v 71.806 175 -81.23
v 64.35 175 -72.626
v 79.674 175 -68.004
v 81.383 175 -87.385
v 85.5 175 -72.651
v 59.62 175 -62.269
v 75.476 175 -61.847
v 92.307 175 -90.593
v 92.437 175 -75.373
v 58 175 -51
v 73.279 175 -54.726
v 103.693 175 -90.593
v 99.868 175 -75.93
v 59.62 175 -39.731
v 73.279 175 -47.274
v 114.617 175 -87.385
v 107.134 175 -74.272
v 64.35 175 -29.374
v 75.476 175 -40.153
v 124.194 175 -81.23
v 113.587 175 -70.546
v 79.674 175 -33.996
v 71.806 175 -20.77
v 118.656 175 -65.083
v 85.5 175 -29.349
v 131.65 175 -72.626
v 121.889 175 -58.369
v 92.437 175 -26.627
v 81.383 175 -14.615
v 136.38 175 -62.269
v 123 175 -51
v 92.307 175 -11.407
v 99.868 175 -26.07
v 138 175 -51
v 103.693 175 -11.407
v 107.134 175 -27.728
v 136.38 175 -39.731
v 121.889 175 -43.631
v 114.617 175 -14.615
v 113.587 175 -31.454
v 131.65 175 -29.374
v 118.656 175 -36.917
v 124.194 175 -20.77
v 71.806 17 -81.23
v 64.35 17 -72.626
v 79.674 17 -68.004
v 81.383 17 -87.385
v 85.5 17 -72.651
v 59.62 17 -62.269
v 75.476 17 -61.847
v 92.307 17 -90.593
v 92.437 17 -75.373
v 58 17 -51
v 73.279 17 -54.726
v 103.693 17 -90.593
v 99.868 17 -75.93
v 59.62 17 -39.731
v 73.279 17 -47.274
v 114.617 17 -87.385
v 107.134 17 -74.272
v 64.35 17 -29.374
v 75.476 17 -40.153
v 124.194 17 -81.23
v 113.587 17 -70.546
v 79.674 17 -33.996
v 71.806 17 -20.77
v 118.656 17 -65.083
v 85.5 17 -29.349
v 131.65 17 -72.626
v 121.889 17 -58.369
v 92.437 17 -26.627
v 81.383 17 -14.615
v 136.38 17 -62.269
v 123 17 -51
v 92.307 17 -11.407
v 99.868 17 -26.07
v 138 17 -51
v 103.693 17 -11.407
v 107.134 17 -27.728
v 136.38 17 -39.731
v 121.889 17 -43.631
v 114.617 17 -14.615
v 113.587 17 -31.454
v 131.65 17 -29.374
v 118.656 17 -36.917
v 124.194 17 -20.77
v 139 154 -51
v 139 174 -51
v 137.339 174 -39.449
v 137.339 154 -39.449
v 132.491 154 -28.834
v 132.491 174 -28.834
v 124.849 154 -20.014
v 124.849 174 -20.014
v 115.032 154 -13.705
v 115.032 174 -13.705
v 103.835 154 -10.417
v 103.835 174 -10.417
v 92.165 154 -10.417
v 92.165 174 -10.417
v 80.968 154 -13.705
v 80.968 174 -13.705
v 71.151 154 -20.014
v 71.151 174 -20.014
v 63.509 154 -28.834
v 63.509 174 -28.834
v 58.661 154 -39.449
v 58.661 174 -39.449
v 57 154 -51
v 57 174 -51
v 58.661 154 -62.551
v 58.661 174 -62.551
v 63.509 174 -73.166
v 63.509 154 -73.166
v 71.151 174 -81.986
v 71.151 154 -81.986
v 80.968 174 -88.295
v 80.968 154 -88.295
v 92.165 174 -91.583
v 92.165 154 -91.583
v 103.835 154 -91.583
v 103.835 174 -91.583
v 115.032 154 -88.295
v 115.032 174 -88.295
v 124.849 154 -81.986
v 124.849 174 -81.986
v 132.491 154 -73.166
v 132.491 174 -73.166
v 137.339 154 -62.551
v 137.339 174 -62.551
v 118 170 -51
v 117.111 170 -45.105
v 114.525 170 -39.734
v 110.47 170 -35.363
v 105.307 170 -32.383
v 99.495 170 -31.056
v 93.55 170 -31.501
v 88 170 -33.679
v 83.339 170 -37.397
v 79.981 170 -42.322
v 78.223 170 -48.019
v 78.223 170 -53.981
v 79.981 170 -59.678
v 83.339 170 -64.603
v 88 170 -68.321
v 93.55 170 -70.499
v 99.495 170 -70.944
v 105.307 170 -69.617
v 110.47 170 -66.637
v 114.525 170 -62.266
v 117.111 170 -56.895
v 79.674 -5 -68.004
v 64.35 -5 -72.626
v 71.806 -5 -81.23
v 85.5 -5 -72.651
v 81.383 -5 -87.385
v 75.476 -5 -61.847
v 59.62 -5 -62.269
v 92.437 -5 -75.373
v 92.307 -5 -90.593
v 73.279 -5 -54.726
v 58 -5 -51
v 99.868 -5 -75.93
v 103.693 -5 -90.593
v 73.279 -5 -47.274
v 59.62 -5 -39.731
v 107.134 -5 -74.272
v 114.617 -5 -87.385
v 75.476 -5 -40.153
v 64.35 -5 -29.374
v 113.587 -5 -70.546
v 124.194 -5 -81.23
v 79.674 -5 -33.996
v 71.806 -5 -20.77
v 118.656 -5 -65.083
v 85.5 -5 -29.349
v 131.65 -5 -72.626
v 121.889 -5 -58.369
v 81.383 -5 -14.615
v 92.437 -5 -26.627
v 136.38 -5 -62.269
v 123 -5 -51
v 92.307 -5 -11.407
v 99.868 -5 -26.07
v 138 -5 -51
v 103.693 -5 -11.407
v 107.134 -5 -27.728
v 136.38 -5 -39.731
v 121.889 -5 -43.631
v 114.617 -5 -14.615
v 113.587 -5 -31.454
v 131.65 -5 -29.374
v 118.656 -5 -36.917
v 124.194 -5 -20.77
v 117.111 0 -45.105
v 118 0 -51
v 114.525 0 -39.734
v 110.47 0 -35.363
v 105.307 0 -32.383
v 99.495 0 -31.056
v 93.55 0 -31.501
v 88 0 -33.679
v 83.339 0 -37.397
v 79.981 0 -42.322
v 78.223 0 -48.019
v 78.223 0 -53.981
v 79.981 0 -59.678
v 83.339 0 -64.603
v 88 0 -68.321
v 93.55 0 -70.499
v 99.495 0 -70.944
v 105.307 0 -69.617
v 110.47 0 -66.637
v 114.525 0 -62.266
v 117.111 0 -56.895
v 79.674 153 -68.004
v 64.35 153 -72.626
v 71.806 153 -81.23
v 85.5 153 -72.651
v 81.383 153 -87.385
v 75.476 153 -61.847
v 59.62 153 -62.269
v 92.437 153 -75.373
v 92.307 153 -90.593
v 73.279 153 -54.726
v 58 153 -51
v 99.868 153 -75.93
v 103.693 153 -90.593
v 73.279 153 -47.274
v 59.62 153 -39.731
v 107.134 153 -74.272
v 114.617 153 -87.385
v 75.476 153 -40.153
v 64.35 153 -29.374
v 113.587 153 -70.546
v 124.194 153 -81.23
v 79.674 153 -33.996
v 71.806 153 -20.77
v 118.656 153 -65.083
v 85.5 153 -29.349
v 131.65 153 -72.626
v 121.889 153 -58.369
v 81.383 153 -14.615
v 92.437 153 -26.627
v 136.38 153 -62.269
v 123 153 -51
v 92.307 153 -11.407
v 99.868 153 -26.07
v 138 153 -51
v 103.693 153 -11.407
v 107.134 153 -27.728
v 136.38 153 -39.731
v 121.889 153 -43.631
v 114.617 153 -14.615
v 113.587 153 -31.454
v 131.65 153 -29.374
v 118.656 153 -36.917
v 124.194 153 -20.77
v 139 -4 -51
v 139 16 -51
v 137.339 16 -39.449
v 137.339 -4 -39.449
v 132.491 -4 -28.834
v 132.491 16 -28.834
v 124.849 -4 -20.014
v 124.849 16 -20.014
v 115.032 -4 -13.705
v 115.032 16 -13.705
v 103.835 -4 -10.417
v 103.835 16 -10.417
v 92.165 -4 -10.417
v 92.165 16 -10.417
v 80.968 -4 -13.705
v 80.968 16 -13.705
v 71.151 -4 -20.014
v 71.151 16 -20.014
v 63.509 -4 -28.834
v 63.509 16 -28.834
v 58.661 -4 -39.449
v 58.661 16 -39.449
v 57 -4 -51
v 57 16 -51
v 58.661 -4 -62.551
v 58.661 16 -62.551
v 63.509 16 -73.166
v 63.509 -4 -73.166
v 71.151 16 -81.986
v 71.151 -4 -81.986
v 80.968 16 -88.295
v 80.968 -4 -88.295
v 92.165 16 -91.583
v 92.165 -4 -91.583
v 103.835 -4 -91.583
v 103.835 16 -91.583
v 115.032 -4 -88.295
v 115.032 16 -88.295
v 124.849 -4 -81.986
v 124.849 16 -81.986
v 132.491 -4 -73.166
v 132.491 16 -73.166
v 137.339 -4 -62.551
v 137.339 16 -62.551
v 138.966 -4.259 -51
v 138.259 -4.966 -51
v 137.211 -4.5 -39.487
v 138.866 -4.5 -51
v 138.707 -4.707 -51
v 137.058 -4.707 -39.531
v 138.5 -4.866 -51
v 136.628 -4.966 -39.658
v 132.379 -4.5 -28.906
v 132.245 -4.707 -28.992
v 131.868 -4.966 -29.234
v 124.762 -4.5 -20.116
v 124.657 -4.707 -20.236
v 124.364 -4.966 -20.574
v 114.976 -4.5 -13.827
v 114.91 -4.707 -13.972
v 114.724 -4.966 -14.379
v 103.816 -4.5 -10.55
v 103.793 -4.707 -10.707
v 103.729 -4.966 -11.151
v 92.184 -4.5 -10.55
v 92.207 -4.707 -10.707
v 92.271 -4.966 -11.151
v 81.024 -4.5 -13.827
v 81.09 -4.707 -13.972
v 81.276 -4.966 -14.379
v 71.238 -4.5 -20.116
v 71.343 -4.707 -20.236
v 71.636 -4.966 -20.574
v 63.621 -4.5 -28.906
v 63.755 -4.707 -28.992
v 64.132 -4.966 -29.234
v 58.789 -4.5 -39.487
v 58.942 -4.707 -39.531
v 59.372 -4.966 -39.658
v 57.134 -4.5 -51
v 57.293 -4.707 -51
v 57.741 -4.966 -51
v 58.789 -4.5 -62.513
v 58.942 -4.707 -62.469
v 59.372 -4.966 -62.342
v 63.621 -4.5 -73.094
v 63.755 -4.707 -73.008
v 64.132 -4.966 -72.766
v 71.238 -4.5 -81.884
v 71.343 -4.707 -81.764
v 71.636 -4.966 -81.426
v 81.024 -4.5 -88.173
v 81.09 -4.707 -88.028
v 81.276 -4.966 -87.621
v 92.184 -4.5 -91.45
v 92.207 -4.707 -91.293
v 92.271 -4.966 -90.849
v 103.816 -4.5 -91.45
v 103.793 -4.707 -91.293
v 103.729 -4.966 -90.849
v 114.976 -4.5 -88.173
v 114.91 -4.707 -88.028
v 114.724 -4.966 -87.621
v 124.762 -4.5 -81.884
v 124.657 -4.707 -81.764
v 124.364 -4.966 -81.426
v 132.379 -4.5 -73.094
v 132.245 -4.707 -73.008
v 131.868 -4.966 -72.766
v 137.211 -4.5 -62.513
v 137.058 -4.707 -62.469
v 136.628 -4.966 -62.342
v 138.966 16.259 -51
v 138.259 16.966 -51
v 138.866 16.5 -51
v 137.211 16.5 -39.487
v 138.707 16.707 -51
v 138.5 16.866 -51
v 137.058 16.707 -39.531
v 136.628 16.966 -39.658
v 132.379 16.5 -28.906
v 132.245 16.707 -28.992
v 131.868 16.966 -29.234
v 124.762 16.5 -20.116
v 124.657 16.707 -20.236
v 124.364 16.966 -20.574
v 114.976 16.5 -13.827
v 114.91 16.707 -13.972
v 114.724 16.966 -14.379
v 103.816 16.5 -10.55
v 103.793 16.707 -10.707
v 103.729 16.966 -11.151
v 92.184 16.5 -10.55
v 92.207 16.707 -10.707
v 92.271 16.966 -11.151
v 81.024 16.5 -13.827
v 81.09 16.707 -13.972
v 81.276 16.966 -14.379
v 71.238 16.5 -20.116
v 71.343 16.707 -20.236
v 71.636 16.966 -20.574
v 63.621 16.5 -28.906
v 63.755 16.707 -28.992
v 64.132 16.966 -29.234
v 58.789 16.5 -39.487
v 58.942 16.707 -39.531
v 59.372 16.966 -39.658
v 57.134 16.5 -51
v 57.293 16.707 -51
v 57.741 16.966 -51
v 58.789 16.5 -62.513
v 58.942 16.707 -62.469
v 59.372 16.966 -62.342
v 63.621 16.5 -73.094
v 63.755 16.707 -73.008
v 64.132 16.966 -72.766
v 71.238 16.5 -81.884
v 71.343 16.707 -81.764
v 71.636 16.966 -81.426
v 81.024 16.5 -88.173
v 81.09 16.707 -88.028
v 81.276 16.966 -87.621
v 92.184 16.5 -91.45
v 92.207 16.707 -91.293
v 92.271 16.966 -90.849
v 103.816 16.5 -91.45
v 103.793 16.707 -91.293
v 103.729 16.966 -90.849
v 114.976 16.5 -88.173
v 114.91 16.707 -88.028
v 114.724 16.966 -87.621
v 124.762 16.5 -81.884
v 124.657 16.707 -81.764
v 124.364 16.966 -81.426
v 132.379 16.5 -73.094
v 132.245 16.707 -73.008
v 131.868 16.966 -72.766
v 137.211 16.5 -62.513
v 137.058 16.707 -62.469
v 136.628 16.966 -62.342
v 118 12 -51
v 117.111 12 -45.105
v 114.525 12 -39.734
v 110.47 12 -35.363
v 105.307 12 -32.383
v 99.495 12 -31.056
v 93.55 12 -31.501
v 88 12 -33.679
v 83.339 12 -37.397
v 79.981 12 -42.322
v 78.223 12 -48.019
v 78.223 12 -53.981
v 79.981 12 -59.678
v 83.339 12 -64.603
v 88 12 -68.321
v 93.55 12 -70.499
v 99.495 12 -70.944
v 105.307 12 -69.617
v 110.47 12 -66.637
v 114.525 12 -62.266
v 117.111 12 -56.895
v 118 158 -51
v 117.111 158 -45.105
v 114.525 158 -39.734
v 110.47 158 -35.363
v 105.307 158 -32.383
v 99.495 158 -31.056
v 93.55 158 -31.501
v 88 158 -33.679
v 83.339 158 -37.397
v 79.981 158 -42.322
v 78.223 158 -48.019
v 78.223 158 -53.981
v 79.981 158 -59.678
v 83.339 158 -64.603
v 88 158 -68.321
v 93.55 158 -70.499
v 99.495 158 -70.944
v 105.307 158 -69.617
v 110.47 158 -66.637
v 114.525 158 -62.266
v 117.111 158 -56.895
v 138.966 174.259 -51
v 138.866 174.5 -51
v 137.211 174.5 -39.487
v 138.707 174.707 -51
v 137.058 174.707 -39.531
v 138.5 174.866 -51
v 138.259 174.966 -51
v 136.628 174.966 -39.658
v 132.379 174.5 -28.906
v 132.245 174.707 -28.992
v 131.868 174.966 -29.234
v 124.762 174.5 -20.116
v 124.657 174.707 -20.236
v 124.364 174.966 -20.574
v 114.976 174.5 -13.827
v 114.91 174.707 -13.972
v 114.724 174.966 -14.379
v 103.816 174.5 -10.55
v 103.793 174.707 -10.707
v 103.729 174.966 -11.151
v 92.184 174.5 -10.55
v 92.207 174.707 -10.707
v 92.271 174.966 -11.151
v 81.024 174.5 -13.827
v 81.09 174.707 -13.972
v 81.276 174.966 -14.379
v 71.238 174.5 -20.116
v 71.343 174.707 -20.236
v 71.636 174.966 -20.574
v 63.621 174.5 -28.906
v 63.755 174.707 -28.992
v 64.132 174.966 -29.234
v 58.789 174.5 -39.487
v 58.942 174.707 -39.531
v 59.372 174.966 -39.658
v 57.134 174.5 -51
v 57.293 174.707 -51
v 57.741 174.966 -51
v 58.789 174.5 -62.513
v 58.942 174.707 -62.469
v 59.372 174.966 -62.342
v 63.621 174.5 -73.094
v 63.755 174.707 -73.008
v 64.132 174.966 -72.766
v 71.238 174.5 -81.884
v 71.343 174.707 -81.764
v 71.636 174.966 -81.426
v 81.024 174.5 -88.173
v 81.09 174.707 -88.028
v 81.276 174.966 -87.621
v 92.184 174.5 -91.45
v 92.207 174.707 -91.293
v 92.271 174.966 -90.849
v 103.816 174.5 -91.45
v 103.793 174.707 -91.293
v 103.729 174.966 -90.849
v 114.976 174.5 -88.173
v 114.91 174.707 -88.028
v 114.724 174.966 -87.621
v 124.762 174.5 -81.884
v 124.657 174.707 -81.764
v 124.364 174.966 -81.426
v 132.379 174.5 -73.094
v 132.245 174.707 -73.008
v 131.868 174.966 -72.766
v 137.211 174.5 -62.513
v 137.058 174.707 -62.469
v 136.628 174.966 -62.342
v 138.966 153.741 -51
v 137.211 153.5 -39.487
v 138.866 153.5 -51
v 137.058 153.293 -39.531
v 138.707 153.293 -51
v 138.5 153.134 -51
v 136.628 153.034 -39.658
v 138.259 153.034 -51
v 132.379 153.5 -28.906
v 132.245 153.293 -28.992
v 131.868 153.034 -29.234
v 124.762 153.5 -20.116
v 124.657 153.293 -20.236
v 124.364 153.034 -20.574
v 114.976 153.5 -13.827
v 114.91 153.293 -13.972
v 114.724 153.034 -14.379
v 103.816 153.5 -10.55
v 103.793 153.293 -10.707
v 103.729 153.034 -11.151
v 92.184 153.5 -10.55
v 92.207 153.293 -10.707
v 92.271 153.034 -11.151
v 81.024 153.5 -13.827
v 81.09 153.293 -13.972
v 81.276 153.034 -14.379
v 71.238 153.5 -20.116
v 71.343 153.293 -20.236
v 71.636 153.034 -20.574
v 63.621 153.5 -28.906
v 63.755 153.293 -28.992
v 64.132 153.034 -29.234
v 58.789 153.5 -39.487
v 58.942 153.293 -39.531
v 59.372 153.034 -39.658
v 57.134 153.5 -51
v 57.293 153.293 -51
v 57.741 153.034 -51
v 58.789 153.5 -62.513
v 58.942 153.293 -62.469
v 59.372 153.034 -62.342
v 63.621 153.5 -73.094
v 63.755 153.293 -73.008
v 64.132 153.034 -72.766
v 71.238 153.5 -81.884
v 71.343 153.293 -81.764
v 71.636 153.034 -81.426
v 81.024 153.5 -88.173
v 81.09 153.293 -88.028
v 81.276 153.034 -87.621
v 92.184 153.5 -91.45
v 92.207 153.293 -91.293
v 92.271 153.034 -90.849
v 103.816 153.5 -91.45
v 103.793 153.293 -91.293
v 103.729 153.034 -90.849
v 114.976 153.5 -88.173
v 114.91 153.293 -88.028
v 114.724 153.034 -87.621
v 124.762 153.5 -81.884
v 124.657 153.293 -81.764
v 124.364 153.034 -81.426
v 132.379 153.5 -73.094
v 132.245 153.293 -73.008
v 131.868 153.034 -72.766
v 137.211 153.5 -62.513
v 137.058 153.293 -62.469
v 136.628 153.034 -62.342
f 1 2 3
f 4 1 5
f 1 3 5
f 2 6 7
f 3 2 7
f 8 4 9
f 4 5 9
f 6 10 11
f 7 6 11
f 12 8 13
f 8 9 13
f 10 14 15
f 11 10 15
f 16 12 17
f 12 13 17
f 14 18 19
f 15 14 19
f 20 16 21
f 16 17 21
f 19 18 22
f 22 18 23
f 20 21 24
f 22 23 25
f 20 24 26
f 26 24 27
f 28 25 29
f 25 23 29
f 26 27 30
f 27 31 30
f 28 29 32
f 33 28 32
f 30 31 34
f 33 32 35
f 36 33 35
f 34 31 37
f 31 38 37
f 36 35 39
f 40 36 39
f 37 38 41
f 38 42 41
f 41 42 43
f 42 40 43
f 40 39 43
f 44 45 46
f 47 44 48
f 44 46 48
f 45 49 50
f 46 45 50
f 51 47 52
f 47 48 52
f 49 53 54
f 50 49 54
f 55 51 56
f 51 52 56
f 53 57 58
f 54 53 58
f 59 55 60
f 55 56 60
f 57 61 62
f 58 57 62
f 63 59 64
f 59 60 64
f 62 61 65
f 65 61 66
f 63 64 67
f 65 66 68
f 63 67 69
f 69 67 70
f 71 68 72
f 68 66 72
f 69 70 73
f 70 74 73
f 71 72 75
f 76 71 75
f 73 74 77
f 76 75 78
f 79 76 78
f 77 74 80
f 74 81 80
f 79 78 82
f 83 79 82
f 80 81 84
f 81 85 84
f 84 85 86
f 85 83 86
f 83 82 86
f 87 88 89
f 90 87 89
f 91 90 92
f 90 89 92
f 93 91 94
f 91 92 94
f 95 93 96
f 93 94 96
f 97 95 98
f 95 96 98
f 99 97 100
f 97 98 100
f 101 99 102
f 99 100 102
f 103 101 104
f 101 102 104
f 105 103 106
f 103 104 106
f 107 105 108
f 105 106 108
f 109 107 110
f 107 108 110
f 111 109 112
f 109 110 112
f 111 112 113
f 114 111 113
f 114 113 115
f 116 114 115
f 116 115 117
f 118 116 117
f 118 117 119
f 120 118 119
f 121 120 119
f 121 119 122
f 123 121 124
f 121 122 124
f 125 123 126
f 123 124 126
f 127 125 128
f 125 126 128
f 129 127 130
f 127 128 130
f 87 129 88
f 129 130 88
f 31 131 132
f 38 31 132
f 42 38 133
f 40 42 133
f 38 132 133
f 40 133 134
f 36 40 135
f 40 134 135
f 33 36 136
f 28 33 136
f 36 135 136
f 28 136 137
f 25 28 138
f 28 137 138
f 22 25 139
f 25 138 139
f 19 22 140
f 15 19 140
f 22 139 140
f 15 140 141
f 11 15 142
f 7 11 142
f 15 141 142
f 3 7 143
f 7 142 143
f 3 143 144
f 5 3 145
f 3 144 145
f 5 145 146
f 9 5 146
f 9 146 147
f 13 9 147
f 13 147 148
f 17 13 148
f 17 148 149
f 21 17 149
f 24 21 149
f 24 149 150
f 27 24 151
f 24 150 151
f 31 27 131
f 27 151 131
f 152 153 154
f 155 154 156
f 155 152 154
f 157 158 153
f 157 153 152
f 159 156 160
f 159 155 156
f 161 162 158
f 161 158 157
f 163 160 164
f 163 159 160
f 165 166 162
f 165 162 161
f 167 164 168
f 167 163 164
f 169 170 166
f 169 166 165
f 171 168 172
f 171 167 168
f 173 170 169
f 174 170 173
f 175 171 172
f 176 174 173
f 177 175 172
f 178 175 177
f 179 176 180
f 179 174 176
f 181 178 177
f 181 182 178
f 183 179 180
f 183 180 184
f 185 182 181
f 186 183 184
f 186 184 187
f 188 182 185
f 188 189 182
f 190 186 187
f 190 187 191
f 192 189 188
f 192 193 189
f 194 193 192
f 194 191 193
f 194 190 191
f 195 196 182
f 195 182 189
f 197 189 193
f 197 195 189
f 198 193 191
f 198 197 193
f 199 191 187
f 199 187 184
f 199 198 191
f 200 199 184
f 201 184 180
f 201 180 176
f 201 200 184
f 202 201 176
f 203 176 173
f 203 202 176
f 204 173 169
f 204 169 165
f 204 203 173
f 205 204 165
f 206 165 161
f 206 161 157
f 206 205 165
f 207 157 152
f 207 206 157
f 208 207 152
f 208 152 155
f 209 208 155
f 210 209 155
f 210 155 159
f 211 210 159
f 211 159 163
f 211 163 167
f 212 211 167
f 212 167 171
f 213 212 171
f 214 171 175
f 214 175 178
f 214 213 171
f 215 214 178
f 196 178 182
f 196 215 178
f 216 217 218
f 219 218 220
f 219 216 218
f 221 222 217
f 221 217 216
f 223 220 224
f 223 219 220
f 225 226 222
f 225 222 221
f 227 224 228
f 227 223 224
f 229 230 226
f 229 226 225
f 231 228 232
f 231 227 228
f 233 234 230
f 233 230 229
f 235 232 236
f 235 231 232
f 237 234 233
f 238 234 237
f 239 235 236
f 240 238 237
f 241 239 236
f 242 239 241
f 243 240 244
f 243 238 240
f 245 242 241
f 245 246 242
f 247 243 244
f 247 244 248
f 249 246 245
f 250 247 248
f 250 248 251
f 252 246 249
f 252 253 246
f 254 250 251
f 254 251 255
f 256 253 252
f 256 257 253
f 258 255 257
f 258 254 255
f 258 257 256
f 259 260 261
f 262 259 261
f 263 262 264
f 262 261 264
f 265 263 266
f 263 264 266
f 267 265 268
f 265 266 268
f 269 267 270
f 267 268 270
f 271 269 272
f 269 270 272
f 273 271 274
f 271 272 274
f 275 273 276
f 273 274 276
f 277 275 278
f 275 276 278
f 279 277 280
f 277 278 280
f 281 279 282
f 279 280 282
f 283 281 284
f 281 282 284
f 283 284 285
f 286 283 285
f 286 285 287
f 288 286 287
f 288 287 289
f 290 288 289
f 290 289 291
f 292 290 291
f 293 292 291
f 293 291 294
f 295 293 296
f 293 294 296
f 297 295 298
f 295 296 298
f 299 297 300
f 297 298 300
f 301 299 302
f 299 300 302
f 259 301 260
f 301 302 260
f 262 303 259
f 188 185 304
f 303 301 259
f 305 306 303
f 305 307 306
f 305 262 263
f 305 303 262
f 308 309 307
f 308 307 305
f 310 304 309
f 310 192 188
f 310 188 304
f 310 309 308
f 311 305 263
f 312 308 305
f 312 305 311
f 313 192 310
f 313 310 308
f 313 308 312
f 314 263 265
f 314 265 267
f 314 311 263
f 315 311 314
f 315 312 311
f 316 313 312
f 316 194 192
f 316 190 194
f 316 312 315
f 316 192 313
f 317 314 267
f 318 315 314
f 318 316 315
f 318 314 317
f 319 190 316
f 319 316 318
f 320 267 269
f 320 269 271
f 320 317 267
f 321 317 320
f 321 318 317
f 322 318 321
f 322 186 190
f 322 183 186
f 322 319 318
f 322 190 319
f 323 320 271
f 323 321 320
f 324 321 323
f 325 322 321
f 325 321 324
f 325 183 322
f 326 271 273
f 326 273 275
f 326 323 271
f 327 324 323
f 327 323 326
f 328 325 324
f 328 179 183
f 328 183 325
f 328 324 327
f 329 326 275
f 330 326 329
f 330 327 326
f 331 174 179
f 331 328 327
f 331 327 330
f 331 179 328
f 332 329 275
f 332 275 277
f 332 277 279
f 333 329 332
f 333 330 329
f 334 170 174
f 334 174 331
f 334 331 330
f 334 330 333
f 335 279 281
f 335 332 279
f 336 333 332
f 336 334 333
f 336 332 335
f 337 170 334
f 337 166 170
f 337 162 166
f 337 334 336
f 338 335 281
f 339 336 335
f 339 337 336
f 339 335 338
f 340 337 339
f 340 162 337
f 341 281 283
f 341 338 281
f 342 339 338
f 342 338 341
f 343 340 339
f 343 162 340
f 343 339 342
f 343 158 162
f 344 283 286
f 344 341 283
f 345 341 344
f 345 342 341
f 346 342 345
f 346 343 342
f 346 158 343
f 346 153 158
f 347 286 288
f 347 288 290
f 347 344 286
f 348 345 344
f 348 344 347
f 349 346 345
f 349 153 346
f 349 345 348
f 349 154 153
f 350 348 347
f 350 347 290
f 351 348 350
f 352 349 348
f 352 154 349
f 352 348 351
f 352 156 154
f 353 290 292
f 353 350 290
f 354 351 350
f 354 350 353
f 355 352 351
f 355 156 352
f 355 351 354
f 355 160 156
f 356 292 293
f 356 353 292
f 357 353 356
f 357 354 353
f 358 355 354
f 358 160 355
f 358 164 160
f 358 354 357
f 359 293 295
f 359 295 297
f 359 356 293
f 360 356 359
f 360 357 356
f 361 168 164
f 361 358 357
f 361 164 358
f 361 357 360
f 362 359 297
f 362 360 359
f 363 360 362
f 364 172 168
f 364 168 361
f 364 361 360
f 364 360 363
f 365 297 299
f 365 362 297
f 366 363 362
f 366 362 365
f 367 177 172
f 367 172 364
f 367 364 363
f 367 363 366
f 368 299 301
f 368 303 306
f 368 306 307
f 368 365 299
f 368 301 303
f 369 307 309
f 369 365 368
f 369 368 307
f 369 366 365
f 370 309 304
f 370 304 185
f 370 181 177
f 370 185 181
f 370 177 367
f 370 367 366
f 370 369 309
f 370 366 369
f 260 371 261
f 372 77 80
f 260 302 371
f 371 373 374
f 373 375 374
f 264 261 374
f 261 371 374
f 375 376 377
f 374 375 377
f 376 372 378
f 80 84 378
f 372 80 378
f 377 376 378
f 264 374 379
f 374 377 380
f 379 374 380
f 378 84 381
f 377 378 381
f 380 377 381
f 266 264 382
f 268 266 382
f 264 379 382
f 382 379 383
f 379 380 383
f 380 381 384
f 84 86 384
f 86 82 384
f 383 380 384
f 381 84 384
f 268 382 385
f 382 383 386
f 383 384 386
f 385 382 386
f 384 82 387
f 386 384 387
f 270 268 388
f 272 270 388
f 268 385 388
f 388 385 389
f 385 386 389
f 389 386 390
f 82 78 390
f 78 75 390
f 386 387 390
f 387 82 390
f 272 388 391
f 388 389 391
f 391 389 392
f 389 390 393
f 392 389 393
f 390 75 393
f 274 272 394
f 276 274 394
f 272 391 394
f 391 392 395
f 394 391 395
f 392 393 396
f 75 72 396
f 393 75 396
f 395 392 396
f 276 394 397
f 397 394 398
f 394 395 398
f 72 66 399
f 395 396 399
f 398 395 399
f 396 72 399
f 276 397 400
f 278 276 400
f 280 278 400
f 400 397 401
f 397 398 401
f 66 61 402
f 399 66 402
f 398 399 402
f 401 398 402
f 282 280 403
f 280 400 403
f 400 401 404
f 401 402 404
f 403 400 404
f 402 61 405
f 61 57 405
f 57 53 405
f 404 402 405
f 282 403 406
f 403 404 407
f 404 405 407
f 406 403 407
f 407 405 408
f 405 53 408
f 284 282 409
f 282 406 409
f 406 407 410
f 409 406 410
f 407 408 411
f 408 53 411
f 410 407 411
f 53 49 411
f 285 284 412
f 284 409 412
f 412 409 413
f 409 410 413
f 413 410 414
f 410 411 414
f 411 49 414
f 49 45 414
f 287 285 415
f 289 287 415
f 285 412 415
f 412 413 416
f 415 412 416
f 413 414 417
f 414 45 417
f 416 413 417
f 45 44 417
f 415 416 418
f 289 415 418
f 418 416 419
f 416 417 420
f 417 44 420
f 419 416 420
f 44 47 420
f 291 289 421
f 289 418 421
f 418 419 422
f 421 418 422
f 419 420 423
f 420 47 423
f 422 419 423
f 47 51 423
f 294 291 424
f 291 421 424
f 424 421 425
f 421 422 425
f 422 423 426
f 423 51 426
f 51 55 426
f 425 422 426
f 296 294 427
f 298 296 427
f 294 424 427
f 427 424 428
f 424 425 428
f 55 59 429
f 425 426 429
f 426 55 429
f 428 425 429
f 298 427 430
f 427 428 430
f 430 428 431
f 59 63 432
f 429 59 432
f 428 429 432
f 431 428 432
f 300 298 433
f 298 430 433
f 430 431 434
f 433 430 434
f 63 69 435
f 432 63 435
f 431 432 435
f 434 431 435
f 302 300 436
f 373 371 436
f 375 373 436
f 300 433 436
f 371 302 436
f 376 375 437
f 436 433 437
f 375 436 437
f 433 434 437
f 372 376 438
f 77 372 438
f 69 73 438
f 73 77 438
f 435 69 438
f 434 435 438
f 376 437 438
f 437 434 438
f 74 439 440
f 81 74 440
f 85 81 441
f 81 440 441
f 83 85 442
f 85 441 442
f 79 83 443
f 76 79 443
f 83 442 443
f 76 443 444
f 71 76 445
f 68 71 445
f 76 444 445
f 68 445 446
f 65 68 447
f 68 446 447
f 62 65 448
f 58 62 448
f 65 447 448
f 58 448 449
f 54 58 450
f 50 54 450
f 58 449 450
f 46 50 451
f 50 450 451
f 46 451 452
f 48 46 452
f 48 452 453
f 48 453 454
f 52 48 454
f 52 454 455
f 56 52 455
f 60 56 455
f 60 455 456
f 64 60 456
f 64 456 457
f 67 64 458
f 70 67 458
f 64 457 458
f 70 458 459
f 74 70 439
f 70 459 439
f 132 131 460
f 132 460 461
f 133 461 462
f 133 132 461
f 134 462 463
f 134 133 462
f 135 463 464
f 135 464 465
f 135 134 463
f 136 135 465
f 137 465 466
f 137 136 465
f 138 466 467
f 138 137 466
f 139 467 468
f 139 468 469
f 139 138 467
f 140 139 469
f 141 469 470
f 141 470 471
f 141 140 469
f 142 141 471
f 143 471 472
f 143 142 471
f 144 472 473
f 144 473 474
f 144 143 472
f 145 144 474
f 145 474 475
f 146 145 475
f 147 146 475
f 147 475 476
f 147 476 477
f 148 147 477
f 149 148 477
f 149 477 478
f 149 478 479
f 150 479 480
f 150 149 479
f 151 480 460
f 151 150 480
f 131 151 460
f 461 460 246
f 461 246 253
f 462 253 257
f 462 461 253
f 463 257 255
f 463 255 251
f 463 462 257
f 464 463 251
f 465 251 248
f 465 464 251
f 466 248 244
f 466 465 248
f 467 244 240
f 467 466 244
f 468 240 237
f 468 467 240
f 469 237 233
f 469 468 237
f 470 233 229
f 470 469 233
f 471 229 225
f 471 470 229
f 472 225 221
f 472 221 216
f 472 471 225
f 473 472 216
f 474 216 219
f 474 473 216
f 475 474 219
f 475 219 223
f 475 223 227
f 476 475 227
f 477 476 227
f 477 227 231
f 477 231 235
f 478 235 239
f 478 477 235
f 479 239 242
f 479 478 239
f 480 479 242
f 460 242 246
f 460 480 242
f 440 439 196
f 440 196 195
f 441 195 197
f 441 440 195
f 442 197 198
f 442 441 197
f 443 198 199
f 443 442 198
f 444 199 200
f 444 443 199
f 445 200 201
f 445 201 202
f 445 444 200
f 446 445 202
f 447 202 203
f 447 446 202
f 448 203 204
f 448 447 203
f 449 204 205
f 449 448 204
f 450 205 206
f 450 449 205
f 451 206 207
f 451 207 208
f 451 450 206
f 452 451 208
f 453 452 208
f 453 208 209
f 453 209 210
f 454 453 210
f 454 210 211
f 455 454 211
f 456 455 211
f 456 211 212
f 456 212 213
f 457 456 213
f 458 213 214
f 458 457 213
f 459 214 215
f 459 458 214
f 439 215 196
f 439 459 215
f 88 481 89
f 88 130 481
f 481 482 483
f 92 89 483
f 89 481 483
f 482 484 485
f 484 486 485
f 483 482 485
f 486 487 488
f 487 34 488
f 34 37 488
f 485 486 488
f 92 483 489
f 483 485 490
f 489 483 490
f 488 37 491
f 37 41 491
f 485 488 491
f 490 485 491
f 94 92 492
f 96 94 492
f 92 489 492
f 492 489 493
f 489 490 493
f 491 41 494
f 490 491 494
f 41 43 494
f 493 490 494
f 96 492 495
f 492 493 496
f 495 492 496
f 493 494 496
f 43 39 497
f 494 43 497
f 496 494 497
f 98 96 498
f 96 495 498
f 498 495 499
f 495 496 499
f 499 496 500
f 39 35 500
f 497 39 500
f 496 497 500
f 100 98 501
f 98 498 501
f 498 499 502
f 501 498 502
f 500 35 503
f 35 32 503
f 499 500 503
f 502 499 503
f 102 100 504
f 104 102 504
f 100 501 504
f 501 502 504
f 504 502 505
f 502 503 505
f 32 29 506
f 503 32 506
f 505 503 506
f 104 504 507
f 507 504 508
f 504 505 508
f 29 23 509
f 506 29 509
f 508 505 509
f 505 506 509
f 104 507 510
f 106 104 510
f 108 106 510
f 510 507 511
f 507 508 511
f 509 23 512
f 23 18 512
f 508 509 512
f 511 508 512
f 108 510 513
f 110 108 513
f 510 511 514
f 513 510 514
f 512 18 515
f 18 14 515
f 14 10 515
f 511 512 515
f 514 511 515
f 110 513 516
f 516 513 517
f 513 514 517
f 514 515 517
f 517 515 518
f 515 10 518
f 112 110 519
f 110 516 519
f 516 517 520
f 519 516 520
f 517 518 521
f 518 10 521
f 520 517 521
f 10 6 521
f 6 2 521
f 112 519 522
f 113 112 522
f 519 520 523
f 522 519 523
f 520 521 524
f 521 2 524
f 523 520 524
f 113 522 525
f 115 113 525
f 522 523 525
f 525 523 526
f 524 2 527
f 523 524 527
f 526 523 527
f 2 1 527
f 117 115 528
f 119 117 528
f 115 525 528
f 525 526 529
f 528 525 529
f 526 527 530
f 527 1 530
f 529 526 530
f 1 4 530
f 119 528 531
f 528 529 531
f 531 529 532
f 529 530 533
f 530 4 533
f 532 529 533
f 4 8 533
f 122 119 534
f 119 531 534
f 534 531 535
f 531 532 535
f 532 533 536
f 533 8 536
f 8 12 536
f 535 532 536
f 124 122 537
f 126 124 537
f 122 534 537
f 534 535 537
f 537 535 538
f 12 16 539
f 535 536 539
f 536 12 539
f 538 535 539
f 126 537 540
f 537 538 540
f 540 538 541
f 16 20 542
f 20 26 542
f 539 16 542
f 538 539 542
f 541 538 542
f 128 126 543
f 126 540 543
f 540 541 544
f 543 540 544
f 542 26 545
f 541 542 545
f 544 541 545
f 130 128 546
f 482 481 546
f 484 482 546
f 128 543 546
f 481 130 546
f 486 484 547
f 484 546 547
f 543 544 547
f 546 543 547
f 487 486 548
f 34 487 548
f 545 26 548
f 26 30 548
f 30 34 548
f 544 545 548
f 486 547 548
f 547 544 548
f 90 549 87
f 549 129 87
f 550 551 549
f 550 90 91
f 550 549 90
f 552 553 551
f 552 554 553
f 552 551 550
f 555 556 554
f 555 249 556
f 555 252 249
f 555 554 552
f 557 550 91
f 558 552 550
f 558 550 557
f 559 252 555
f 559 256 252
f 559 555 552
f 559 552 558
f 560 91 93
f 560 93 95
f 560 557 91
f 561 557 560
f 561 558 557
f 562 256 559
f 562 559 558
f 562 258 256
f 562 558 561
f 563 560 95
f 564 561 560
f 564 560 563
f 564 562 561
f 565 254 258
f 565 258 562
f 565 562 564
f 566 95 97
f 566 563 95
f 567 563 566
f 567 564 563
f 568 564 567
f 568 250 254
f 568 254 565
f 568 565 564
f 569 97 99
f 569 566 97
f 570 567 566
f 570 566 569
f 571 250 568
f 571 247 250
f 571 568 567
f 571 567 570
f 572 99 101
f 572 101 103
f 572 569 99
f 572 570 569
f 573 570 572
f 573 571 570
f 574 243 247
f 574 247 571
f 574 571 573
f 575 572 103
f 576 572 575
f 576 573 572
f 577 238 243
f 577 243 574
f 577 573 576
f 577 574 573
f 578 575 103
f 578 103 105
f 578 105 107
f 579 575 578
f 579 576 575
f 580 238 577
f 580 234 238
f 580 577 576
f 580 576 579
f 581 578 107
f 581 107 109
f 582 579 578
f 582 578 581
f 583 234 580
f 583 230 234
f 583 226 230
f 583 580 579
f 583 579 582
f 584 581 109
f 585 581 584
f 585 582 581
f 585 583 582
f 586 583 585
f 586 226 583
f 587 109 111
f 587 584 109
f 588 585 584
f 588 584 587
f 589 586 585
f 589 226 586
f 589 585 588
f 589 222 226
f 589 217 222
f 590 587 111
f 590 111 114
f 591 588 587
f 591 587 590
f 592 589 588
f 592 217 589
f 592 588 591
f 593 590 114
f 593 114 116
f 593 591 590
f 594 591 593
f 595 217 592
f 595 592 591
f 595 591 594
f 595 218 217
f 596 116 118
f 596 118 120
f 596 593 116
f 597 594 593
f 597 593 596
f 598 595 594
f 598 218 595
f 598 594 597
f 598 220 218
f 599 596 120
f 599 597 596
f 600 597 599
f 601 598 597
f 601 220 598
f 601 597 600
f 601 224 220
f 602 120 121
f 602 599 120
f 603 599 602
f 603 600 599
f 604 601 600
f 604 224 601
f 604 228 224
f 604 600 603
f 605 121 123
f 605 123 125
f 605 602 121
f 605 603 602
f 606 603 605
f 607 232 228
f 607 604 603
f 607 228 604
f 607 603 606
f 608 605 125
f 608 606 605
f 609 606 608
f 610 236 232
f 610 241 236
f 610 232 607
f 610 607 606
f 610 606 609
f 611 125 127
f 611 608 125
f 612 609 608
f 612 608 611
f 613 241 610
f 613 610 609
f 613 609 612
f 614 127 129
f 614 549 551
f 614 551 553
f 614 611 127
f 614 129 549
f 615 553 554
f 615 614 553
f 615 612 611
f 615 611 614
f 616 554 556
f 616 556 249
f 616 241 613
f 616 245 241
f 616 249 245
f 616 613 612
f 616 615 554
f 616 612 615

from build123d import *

# Parameters (mm, degrees)
CYLINDER279_R          = 20
CYLINDER279_DEPTH      = 22
CYLINDER279_ROLL_ANGLE = 90
CYLINDER278_R          = 41
CYLINDER278_DEPTH      = 22
CYLINDER278_ROLL_ANGLE = 90
FILLET261_R            = 1
CYLINDER277_R          = 20
CYLINDER277_DEPTH      = 22
CYLINDER277_ROLL_ANGLE = 90
CYLINDER276_R          = 41
CYLINDER276_DEPTH      = 22
CYLINDER276_ROLL_ANGLE = 90
FILLET260_R            = 1
CHAMFER057_SIZE        = 5


with BuildPart() as cylinder279:
    # Cylinder279 → Cylinder279 (new body)
    with BuildSketch(Plane.XY):
        Circle(CYLINDER279_R)
    extrude(amount=CYLINDER279_DEPTH)


with BuildPart() as cylinder279_1:
    # Cylinder279 roll: moved
    add(cylinder279.part.rotate(Axis((0, 0, 0), (1, 0, 0)), CYLINDER279_ROLL_ANGLE))


with BuildPart() as cylinder279_2:
    # Cylinder279 placement: moved
    add(cylinder279_1.part)


with BuildPart() as fillet261:
    # Cylinder278 → Cylinder278 (new body)
    with BuildSketch(Plane.XY):
        Circle(CYLINDER278_R)
    extrude(amount=CYLINDER278_DEPTH)


with BuildPart() as fillet261_1:
    # Cylinder278 roll: moved
    add(fillet261.part.rotate(Axis((0, 0, 0), (1, 0, 0)), CYLINDER278_ROLL_ANGLE))


with BuildPart() as fillet261_2:
    # Cylinder278 placement: moved
    add(fillet261_1.part)

    # Cut422: cut Cylinder279
    add(cylinder279_2.part, mode=Mode.SUBTRACT)

    # Fillet261
    fillet261_edges = [fillet261_2.edges().sort_by_distance(p)[0] for p in [
        (-41, -22, 0),
        (-41, 0, 0),
    ]]
    fillet(fillet261_edges, radius=FILLET261_R)


with BuildPart() as fillet261_3:
    # Fillet261 placement: moved
    add(fillet261_2.part.moved(Location((0, 175, 0))))


with BuildPart() as cylinder277:
    # Cylinder277 → Cylinder277 (new body)
    with BuildSketch(Plane.XY):
        Circle(CYLINDER277_R)
    extrude(amount=CYLINDER277_DEPTH)


with BuildPart() as cylinder277_1:
    # Cylinder277 roll: moved
    add(cylinder277.part.rotate(Axis((0, 0, 0), (1, 0, 0)), CYLINDER277_ROLL_ANGLE))


with BuildPart() as cylinder277_2:
    # Cylinder277 placement: moved
    add(cylinder277_1.part)


with BuildPart() as whels_front:
    # Cylinder276 → Cylinder276 (new body)
    with BuildSketch(Plane.XY):
        Circle(CYLINDER276_R)
    extrude(amount=CYLINDER276_DEPTH)


with BuildPart() as whels_front_1:
    # Cylinder276 roll: moved
    add(whels_front.part.rotate(Axis((0, 0, 0), (1, 0, 0)), CYLINDER276_ROLL_ANGLE))


with BuildPart() as whels_front_2:
    # Cylinder276 placement: moved
    add(whels_front_1.part)

    # Cut421: cut Cylinder277
    add(cylinder277_2.part, mode=Mode.SUBTRACT)

    # Fillet260
    fillet260_edges = [whels_front_2.edges().sort_by_distance(p)[0] for p in [
        (-41, -22, 0),
        (-41, 0, 0),
    ]]
    fillet(fillet260_edges, radius=FILLET260_R)


with BuildPart() as whels_front_3:
    # Fillet260 placement: moved
    add(whels_front_2.part.moved(Location((0, 17, 0))))

    # Fusion245: union Fillet261
    add(fillet261_3.part)


with BuildPart() as whels_front_4:
    # Fusion245 placement: moved
    add(whels_front_3.part.moved(Location((98, 0, -51))))

    # Chamfer057
    chamfer057_edges = [whels_front_4.edges().sort_by_distance(p)[0] for p in [
        (78, 17, -51),
        (78, -5, -51),
        (78, 175, -51),
        (78, 153, -51),
    ]]
    chamfer(chamfer057_edges, length=CHAMFER057_SIZE)


solid = whels_front_4.part
